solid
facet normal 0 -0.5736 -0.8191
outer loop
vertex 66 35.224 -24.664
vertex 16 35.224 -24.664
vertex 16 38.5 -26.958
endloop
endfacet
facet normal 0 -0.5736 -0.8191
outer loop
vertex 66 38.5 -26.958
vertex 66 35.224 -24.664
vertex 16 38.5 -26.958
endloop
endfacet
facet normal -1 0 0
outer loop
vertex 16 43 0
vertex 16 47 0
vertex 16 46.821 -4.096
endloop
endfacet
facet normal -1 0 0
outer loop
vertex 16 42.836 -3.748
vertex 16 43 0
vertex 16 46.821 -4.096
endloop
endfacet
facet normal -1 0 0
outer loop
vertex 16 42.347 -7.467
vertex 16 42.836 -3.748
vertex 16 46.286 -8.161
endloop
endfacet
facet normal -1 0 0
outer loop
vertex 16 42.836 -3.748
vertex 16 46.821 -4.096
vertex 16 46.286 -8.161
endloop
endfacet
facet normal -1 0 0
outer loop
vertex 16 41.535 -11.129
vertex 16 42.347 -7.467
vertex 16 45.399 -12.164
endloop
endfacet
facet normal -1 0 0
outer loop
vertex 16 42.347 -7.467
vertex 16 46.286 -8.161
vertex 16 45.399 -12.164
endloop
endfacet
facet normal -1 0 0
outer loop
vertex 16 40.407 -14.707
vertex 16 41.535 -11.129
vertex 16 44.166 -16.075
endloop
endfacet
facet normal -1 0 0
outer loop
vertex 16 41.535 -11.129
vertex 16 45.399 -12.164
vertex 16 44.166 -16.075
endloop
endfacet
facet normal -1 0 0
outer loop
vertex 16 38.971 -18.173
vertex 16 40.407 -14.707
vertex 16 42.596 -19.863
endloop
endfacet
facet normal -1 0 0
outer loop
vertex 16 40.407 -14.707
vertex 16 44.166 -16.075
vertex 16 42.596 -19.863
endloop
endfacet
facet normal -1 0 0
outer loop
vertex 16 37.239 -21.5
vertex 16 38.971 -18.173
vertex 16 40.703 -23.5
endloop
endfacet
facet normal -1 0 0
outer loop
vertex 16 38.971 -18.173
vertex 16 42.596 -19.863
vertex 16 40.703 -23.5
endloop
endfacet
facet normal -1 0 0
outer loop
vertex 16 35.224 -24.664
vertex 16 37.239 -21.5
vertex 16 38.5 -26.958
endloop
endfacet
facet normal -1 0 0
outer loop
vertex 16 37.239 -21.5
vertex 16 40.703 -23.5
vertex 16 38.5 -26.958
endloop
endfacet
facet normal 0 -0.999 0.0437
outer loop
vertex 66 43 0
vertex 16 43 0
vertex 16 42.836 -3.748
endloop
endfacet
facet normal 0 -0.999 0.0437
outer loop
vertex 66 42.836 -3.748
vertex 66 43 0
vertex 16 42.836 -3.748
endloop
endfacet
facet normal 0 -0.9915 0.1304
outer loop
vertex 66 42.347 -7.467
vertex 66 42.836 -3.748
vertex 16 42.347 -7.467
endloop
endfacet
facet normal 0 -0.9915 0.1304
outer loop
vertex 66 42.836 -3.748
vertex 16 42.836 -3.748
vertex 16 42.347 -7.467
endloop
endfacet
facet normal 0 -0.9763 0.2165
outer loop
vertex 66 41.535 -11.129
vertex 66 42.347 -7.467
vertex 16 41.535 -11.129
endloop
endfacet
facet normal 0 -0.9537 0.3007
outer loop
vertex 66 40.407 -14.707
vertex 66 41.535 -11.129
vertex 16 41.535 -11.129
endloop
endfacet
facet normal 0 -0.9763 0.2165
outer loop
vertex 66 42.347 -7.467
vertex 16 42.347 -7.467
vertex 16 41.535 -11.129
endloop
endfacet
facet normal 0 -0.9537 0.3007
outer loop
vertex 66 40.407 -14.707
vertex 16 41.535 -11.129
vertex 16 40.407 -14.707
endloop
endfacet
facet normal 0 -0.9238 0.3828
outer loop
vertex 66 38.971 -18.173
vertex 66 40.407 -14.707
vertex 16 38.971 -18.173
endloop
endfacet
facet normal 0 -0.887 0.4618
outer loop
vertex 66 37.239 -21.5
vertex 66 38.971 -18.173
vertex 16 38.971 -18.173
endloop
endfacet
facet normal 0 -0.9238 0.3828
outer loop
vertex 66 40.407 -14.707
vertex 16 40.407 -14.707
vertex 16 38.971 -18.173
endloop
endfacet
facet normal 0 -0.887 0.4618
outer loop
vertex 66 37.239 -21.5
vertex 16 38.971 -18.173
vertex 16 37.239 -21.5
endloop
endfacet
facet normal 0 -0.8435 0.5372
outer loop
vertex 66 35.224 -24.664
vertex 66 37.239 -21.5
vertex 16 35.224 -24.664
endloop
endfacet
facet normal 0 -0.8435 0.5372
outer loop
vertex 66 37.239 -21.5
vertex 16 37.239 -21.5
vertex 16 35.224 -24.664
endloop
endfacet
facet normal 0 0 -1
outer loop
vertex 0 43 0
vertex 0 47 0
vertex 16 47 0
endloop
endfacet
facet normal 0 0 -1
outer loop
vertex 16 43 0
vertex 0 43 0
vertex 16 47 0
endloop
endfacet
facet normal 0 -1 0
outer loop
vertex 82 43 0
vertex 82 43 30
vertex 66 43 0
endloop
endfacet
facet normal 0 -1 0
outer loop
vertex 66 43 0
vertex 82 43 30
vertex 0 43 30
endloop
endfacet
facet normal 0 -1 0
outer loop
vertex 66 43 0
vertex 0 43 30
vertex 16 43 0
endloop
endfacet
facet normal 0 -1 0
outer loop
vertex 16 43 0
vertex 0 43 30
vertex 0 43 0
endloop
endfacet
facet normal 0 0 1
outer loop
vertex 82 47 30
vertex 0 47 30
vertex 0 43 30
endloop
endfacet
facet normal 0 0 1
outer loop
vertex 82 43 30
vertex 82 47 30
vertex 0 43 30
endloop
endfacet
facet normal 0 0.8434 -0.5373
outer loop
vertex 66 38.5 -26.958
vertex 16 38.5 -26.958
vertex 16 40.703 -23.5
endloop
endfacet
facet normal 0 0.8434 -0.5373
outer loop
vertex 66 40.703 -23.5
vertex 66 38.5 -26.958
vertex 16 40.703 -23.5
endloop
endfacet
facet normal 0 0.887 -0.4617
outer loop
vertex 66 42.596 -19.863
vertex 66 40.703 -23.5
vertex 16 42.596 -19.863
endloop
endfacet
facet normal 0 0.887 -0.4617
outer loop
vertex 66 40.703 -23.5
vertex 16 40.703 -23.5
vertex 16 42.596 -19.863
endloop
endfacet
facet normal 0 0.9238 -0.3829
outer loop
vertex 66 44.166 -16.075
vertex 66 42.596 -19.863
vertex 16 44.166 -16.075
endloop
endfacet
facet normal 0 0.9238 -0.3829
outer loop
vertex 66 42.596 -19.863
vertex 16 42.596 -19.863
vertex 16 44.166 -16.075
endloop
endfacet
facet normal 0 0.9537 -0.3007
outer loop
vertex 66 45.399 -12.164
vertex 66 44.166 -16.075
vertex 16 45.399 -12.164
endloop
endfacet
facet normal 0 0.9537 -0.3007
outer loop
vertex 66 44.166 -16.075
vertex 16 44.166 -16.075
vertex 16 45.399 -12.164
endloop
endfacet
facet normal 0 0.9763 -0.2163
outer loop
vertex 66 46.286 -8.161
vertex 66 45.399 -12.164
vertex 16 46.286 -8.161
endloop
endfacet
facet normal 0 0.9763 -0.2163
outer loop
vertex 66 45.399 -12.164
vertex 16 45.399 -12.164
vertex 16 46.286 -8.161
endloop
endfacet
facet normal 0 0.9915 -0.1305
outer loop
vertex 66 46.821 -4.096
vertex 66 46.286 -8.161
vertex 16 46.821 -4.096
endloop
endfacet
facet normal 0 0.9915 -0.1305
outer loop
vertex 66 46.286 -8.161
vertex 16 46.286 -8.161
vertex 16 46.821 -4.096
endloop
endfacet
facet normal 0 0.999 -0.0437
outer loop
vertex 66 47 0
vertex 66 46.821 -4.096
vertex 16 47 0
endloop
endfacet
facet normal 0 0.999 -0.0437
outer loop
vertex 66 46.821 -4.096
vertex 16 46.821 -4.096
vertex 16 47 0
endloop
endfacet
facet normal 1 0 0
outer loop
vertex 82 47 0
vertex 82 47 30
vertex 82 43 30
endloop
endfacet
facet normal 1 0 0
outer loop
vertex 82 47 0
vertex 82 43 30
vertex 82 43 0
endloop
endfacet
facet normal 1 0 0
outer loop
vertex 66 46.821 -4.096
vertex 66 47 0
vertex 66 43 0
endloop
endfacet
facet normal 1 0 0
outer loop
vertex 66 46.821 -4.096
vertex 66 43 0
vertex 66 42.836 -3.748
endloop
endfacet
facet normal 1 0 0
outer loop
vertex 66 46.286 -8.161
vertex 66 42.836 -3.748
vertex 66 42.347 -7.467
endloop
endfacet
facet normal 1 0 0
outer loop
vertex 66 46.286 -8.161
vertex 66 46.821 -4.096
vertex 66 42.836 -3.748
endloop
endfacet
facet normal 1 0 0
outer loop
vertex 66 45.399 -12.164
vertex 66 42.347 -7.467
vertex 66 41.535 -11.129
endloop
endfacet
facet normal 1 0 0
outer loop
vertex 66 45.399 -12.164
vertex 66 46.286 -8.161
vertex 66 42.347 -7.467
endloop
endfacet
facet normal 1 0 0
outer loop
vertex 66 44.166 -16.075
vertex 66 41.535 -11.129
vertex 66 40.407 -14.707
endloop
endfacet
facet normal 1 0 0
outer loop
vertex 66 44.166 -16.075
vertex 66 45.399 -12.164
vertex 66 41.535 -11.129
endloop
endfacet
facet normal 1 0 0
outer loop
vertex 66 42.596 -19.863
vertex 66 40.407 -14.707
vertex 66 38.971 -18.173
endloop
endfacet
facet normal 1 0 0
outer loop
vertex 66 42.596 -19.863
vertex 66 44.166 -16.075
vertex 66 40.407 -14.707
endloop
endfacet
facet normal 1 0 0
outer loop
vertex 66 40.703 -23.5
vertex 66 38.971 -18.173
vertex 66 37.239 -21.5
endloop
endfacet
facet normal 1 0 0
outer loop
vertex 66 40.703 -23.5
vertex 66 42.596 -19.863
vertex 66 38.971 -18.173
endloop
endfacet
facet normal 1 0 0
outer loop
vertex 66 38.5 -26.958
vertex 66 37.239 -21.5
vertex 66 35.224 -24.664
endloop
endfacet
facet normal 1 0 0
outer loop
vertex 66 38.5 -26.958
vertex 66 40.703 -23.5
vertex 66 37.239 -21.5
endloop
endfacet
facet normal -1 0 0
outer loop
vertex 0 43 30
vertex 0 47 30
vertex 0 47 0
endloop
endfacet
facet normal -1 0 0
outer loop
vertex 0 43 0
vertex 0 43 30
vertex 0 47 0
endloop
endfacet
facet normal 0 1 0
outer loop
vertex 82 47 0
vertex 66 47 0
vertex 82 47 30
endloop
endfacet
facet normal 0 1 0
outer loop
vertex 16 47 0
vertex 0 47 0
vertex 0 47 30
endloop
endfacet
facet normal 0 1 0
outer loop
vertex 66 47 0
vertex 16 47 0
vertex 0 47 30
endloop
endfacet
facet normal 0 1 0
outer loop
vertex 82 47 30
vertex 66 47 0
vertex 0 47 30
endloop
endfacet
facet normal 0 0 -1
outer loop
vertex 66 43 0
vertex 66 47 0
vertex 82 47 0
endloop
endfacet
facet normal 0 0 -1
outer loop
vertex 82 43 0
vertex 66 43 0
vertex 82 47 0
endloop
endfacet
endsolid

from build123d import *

# Parameters (mm, degrees)
ESTRUSIONE_ESTRUSIONE1_DEPTH = 82
SCHIZZO2_W                   = 16
SCHIZZO2_H                   = 26.958092508
TAGLIO_ESTRUSIONE1_DEPTH     = 20


with BuildPart() as part:
    # Schizzo1 → Estrusione-Estrusione1 (new body)
    with BuildSketch(Plane(origin=(0, 0, 0), x_dir=(0, 0, -1), z_dir=(1, 0, 0))):
        with BuildLine():
            Line((0, 47), (-30, 47))
            Line((-30, 47), (-30, 43))
            Line((-30, 43), (0, 43))
            ThreePointArc((0, 43), (12.930349379, 41.009828882), (24.663786763, 35.223537904))
            Line((24.663786763, 35.223537904), (26.958092508, 38.500146082))
            ThreePointArc((26.958092508, 38.500146082), (14.133172577, 44.824696685), (0, 47))
        make_face()
    extrude(amount=ESTRUSIONE_ESTRUSIONE1_DEPTH)

    # Schizzo2 → Taglio-Estrusione1 (cut)
    with BuildSketch(Plane(origin=(0, 47, 0), x_dir=(1, 0, 0), z_dir=(0, 1, 0))):
        with Locations((8, 13.479046254)):
            Rectangle(SCHIZZO2_W, SCHIZZO2_H)
        with Locations((74, 13.479046254)):
            Rectangle(SCHIZZO2_W, SCHIZZO2_H)
    extrude(amount=-TAGLIO_ESTRUSIONE1_DEPTH, mode=Mode.SUBTRACT)


solid = part.part
